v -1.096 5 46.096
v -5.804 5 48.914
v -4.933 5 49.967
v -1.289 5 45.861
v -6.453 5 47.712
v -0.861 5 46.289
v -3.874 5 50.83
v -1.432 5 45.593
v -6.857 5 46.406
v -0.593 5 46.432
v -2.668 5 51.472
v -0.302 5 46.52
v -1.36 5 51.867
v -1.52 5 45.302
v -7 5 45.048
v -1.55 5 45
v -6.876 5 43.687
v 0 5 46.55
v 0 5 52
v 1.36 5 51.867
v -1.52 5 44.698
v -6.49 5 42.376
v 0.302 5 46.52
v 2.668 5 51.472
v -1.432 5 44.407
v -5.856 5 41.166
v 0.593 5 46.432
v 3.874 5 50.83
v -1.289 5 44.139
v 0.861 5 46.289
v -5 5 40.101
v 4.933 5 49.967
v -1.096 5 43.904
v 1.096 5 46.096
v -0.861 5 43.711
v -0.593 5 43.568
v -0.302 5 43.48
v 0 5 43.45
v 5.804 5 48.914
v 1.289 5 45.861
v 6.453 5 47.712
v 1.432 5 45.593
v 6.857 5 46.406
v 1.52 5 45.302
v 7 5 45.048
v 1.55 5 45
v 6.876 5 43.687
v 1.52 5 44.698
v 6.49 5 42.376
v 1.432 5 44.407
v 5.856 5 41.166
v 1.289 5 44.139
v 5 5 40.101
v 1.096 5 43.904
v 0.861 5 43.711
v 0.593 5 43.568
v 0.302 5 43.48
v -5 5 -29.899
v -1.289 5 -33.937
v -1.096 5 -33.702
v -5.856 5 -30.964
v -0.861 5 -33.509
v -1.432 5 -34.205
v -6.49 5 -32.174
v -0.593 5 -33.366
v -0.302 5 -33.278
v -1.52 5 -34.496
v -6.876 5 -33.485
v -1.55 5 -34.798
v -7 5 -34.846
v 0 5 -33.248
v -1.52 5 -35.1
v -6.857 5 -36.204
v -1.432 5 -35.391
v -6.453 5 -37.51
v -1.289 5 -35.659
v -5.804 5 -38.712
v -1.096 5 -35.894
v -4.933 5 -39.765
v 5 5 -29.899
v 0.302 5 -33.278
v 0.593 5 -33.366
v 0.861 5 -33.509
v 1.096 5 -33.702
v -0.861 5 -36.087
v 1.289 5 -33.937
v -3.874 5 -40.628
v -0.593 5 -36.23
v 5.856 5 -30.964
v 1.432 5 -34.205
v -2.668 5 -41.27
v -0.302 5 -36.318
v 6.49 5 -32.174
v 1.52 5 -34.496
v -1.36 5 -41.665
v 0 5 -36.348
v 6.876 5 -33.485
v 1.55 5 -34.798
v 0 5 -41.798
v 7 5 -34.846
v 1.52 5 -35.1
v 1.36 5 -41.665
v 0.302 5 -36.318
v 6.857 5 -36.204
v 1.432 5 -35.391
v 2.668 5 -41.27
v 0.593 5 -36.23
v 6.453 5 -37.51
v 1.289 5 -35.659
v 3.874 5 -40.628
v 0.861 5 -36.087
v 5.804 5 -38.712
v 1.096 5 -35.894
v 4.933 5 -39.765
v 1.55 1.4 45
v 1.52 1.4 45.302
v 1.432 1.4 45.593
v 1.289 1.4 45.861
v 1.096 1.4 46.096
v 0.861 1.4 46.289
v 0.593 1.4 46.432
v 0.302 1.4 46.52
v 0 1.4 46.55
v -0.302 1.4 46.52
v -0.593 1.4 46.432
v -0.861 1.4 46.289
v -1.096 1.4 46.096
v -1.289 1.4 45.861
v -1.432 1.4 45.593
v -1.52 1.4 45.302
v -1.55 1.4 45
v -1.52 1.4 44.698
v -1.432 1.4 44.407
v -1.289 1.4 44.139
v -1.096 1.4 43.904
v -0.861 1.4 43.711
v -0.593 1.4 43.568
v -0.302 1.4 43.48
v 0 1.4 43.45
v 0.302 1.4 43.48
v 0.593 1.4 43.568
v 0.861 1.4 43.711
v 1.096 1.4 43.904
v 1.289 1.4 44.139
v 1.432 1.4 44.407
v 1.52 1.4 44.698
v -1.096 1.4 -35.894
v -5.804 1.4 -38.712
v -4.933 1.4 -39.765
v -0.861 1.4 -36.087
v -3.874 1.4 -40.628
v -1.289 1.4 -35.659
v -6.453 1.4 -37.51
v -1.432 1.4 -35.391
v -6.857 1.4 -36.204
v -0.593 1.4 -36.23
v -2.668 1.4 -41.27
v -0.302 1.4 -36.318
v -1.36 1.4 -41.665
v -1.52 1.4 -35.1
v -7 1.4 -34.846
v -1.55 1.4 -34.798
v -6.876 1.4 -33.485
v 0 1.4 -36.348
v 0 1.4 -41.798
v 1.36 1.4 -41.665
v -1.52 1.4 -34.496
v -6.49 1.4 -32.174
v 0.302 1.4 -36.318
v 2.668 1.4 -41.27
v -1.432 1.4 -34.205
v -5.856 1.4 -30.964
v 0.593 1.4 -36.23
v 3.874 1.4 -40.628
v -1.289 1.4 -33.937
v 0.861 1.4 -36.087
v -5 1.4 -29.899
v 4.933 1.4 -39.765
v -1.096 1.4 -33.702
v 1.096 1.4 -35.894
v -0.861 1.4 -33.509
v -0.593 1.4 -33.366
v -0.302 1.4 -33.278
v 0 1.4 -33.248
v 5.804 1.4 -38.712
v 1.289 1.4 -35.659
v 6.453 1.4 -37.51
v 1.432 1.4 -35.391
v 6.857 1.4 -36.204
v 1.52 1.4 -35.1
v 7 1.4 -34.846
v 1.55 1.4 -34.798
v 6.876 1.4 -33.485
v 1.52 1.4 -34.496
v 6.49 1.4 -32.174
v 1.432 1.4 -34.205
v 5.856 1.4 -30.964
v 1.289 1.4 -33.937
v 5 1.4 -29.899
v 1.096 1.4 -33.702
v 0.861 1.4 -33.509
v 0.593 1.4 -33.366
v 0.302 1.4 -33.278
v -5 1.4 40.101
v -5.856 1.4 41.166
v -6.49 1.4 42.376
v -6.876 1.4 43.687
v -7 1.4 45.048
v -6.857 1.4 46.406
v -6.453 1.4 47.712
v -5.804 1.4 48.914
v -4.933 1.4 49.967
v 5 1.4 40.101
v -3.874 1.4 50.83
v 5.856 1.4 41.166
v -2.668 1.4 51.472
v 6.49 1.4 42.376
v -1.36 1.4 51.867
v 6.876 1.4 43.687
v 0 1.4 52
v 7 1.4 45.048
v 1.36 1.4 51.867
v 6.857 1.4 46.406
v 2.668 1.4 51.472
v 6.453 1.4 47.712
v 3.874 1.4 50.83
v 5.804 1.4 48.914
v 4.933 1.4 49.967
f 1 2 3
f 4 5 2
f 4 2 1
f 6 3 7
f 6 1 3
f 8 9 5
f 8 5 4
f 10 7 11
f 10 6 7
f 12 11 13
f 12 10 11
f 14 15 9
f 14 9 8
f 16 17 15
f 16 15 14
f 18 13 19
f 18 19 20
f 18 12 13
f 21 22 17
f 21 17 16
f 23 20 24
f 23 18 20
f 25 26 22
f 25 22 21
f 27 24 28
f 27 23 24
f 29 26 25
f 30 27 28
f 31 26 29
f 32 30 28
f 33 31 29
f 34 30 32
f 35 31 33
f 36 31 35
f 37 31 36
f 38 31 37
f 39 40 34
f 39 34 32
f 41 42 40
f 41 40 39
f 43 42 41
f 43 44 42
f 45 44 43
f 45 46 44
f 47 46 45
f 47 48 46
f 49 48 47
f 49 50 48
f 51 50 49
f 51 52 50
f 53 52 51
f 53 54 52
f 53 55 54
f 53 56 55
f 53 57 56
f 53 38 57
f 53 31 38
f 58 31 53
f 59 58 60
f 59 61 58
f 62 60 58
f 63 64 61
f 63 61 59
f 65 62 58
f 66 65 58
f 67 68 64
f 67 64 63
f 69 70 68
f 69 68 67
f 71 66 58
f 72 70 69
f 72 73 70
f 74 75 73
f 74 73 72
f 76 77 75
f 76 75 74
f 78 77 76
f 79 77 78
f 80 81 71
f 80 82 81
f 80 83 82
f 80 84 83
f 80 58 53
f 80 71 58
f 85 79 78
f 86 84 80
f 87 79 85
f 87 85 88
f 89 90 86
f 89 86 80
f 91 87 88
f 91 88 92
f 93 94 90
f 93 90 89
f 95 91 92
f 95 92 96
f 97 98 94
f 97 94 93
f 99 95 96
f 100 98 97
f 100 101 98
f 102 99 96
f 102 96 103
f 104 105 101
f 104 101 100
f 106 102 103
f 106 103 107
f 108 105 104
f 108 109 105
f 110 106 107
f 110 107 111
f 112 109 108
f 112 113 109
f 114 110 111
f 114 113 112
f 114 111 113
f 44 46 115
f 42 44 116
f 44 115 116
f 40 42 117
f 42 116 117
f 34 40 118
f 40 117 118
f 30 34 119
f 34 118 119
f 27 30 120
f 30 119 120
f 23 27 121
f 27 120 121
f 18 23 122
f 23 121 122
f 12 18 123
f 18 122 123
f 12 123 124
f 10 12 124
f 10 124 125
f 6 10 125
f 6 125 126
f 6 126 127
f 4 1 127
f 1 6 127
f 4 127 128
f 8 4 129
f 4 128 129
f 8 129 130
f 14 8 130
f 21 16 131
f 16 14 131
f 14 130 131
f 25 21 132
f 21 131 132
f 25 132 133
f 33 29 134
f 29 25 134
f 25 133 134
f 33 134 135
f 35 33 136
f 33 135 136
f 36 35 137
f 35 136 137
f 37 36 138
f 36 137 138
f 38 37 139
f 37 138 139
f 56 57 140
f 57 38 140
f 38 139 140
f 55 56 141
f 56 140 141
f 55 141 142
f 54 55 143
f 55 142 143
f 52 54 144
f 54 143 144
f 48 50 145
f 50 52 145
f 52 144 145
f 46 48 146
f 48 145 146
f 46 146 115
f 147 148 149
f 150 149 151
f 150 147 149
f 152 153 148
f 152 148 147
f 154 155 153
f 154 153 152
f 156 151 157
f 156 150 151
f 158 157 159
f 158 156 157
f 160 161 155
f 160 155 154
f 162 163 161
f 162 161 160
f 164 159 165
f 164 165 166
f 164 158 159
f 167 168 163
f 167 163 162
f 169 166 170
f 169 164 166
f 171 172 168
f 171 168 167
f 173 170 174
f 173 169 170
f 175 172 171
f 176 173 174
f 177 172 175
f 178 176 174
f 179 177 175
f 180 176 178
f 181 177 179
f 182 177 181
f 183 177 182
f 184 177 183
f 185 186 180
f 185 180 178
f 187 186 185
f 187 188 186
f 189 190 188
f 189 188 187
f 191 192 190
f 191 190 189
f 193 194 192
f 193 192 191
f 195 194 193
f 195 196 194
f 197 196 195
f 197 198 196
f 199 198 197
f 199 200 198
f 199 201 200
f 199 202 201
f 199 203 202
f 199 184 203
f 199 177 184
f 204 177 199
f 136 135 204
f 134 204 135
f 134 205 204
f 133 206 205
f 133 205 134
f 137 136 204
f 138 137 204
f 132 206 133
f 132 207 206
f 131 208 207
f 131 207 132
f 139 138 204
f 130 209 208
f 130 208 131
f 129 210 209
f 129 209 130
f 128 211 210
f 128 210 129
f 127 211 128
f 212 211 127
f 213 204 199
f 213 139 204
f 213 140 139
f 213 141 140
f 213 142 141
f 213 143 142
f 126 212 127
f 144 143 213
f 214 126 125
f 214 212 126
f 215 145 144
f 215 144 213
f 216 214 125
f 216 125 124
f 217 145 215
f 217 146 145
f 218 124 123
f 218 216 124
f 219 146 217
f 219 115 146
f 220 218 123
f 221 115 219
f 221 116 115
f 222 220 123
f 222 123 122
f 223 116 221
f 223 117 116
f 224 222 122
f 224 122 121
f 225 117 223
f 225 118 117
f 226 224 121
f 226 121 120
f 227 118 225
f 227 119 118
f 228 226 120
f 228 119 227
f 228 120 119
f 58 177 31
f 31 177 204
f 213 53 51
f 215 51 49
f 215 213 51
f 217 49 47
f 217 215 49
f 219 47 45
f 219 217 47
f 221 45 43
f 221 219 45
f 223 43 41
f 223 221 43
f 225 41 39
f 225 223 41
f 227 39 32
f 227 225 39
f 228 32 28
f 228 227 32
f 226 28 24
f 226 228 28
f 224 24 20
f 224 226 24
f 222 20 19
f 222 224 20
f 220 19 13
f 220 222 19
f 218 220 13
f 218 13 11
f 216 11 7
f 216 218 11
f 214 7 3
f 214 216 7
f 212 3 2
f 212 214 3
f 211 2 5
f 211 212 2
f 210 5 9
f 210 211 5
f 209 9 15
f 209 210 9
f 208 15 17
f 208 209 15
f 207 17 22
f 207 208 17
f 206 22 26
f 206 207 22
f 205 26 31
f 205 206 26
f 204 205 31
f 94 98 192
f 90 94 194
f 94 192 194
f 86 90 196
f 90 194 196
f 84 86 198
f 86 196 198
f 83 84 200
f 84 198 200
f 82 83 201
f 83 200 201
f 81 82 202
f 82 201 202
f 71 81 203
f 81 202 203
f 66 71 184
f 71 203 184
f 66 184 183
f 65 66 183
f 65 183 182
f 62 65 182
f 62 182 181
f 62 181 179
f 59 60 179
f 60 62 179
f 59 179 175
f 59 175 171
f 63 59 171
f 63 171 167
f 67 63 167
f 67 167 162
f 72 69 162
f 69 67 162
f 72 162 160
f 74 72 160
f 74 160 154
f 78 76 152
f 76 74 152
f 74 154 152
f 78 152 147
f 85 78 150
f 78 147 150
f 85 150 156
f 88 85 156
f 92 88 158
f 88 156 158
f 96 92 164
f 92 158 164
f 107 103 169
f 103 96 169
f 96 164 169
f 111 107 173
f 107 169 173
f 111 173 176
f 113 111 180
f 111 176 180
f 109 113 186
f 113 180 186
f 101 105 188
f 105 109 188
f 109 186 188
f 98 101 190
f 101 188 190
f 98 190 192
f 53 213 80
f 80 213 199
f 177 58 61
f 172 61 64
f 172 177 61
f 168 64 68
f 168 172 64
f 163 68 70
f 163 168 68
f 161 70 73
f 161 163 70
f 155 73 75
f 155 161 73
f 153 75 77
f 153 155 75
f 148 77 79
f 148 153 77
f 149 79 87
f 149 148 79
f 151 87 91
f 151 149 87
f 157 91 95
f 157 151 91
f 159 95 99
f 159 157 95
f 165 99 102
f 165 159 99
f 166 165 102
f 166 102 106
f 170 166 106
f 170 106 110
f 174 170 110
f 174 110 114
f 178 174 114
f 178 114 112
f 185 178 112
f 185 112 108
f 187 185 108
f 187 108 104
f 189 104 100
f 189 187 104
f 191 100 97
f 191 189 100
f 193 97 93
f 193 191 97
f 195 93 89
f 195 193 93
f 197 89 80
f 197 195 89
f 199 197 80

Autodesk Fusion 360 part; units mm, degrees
sketch "Sketch1" plane through (0, 0, 0) normal (0, 1, 0) x (1, 0, 0)
  line L0 (-5, 29.899) -> (-5, -40.101)
  line L1 (5, -40.101) -> (5, 29.899)
  circle A0 centre (0, -45) radius 1.55
  arc A1 (-5, -40.101) -> (5, -40.101) centre (0, -45) ccw
  arc A2 (5, 29.899) -> (-5, 29.899) centre (0, 34.798) ccw
  circle A3 centre (0, 34.798) radius 1.55
  dimension "d3" = 3.1
  dimension "d4" = 14
  dimension "d7" = 70
  dimension "d8" = 7
  dimension "d9" = 3.1
extrude "Extrude1" add sketch "Sketch1" along normal blind 5
sketch "Sketch2" plane through (0, 0, 0) normal (0, -1, 0) x (1, 0, 0)
  circle A0 centre (0, -34.798) radius 1.55
  circle A1 centre (0, 45) radius 1.55
  arc A2 (-5, -29.899) -> (5, -29.899) centre (0, -34.798) ccw
  line L0 (5, -29.899) -> (5, 40.101)
  arc A3 (5, 40.101) -> (-5, 40.101) centre (0, 45) ccw
  line L1 (-5, 40.101) -> (-5, -29.899)
extrude "Extrude2" cut sketch "Sketch2" against normal blind 1
extrude "Extrude3" cut 1 faces at (-1.6667, 1, 16.7677) along direction (0, 1, 0) blind 0.4
